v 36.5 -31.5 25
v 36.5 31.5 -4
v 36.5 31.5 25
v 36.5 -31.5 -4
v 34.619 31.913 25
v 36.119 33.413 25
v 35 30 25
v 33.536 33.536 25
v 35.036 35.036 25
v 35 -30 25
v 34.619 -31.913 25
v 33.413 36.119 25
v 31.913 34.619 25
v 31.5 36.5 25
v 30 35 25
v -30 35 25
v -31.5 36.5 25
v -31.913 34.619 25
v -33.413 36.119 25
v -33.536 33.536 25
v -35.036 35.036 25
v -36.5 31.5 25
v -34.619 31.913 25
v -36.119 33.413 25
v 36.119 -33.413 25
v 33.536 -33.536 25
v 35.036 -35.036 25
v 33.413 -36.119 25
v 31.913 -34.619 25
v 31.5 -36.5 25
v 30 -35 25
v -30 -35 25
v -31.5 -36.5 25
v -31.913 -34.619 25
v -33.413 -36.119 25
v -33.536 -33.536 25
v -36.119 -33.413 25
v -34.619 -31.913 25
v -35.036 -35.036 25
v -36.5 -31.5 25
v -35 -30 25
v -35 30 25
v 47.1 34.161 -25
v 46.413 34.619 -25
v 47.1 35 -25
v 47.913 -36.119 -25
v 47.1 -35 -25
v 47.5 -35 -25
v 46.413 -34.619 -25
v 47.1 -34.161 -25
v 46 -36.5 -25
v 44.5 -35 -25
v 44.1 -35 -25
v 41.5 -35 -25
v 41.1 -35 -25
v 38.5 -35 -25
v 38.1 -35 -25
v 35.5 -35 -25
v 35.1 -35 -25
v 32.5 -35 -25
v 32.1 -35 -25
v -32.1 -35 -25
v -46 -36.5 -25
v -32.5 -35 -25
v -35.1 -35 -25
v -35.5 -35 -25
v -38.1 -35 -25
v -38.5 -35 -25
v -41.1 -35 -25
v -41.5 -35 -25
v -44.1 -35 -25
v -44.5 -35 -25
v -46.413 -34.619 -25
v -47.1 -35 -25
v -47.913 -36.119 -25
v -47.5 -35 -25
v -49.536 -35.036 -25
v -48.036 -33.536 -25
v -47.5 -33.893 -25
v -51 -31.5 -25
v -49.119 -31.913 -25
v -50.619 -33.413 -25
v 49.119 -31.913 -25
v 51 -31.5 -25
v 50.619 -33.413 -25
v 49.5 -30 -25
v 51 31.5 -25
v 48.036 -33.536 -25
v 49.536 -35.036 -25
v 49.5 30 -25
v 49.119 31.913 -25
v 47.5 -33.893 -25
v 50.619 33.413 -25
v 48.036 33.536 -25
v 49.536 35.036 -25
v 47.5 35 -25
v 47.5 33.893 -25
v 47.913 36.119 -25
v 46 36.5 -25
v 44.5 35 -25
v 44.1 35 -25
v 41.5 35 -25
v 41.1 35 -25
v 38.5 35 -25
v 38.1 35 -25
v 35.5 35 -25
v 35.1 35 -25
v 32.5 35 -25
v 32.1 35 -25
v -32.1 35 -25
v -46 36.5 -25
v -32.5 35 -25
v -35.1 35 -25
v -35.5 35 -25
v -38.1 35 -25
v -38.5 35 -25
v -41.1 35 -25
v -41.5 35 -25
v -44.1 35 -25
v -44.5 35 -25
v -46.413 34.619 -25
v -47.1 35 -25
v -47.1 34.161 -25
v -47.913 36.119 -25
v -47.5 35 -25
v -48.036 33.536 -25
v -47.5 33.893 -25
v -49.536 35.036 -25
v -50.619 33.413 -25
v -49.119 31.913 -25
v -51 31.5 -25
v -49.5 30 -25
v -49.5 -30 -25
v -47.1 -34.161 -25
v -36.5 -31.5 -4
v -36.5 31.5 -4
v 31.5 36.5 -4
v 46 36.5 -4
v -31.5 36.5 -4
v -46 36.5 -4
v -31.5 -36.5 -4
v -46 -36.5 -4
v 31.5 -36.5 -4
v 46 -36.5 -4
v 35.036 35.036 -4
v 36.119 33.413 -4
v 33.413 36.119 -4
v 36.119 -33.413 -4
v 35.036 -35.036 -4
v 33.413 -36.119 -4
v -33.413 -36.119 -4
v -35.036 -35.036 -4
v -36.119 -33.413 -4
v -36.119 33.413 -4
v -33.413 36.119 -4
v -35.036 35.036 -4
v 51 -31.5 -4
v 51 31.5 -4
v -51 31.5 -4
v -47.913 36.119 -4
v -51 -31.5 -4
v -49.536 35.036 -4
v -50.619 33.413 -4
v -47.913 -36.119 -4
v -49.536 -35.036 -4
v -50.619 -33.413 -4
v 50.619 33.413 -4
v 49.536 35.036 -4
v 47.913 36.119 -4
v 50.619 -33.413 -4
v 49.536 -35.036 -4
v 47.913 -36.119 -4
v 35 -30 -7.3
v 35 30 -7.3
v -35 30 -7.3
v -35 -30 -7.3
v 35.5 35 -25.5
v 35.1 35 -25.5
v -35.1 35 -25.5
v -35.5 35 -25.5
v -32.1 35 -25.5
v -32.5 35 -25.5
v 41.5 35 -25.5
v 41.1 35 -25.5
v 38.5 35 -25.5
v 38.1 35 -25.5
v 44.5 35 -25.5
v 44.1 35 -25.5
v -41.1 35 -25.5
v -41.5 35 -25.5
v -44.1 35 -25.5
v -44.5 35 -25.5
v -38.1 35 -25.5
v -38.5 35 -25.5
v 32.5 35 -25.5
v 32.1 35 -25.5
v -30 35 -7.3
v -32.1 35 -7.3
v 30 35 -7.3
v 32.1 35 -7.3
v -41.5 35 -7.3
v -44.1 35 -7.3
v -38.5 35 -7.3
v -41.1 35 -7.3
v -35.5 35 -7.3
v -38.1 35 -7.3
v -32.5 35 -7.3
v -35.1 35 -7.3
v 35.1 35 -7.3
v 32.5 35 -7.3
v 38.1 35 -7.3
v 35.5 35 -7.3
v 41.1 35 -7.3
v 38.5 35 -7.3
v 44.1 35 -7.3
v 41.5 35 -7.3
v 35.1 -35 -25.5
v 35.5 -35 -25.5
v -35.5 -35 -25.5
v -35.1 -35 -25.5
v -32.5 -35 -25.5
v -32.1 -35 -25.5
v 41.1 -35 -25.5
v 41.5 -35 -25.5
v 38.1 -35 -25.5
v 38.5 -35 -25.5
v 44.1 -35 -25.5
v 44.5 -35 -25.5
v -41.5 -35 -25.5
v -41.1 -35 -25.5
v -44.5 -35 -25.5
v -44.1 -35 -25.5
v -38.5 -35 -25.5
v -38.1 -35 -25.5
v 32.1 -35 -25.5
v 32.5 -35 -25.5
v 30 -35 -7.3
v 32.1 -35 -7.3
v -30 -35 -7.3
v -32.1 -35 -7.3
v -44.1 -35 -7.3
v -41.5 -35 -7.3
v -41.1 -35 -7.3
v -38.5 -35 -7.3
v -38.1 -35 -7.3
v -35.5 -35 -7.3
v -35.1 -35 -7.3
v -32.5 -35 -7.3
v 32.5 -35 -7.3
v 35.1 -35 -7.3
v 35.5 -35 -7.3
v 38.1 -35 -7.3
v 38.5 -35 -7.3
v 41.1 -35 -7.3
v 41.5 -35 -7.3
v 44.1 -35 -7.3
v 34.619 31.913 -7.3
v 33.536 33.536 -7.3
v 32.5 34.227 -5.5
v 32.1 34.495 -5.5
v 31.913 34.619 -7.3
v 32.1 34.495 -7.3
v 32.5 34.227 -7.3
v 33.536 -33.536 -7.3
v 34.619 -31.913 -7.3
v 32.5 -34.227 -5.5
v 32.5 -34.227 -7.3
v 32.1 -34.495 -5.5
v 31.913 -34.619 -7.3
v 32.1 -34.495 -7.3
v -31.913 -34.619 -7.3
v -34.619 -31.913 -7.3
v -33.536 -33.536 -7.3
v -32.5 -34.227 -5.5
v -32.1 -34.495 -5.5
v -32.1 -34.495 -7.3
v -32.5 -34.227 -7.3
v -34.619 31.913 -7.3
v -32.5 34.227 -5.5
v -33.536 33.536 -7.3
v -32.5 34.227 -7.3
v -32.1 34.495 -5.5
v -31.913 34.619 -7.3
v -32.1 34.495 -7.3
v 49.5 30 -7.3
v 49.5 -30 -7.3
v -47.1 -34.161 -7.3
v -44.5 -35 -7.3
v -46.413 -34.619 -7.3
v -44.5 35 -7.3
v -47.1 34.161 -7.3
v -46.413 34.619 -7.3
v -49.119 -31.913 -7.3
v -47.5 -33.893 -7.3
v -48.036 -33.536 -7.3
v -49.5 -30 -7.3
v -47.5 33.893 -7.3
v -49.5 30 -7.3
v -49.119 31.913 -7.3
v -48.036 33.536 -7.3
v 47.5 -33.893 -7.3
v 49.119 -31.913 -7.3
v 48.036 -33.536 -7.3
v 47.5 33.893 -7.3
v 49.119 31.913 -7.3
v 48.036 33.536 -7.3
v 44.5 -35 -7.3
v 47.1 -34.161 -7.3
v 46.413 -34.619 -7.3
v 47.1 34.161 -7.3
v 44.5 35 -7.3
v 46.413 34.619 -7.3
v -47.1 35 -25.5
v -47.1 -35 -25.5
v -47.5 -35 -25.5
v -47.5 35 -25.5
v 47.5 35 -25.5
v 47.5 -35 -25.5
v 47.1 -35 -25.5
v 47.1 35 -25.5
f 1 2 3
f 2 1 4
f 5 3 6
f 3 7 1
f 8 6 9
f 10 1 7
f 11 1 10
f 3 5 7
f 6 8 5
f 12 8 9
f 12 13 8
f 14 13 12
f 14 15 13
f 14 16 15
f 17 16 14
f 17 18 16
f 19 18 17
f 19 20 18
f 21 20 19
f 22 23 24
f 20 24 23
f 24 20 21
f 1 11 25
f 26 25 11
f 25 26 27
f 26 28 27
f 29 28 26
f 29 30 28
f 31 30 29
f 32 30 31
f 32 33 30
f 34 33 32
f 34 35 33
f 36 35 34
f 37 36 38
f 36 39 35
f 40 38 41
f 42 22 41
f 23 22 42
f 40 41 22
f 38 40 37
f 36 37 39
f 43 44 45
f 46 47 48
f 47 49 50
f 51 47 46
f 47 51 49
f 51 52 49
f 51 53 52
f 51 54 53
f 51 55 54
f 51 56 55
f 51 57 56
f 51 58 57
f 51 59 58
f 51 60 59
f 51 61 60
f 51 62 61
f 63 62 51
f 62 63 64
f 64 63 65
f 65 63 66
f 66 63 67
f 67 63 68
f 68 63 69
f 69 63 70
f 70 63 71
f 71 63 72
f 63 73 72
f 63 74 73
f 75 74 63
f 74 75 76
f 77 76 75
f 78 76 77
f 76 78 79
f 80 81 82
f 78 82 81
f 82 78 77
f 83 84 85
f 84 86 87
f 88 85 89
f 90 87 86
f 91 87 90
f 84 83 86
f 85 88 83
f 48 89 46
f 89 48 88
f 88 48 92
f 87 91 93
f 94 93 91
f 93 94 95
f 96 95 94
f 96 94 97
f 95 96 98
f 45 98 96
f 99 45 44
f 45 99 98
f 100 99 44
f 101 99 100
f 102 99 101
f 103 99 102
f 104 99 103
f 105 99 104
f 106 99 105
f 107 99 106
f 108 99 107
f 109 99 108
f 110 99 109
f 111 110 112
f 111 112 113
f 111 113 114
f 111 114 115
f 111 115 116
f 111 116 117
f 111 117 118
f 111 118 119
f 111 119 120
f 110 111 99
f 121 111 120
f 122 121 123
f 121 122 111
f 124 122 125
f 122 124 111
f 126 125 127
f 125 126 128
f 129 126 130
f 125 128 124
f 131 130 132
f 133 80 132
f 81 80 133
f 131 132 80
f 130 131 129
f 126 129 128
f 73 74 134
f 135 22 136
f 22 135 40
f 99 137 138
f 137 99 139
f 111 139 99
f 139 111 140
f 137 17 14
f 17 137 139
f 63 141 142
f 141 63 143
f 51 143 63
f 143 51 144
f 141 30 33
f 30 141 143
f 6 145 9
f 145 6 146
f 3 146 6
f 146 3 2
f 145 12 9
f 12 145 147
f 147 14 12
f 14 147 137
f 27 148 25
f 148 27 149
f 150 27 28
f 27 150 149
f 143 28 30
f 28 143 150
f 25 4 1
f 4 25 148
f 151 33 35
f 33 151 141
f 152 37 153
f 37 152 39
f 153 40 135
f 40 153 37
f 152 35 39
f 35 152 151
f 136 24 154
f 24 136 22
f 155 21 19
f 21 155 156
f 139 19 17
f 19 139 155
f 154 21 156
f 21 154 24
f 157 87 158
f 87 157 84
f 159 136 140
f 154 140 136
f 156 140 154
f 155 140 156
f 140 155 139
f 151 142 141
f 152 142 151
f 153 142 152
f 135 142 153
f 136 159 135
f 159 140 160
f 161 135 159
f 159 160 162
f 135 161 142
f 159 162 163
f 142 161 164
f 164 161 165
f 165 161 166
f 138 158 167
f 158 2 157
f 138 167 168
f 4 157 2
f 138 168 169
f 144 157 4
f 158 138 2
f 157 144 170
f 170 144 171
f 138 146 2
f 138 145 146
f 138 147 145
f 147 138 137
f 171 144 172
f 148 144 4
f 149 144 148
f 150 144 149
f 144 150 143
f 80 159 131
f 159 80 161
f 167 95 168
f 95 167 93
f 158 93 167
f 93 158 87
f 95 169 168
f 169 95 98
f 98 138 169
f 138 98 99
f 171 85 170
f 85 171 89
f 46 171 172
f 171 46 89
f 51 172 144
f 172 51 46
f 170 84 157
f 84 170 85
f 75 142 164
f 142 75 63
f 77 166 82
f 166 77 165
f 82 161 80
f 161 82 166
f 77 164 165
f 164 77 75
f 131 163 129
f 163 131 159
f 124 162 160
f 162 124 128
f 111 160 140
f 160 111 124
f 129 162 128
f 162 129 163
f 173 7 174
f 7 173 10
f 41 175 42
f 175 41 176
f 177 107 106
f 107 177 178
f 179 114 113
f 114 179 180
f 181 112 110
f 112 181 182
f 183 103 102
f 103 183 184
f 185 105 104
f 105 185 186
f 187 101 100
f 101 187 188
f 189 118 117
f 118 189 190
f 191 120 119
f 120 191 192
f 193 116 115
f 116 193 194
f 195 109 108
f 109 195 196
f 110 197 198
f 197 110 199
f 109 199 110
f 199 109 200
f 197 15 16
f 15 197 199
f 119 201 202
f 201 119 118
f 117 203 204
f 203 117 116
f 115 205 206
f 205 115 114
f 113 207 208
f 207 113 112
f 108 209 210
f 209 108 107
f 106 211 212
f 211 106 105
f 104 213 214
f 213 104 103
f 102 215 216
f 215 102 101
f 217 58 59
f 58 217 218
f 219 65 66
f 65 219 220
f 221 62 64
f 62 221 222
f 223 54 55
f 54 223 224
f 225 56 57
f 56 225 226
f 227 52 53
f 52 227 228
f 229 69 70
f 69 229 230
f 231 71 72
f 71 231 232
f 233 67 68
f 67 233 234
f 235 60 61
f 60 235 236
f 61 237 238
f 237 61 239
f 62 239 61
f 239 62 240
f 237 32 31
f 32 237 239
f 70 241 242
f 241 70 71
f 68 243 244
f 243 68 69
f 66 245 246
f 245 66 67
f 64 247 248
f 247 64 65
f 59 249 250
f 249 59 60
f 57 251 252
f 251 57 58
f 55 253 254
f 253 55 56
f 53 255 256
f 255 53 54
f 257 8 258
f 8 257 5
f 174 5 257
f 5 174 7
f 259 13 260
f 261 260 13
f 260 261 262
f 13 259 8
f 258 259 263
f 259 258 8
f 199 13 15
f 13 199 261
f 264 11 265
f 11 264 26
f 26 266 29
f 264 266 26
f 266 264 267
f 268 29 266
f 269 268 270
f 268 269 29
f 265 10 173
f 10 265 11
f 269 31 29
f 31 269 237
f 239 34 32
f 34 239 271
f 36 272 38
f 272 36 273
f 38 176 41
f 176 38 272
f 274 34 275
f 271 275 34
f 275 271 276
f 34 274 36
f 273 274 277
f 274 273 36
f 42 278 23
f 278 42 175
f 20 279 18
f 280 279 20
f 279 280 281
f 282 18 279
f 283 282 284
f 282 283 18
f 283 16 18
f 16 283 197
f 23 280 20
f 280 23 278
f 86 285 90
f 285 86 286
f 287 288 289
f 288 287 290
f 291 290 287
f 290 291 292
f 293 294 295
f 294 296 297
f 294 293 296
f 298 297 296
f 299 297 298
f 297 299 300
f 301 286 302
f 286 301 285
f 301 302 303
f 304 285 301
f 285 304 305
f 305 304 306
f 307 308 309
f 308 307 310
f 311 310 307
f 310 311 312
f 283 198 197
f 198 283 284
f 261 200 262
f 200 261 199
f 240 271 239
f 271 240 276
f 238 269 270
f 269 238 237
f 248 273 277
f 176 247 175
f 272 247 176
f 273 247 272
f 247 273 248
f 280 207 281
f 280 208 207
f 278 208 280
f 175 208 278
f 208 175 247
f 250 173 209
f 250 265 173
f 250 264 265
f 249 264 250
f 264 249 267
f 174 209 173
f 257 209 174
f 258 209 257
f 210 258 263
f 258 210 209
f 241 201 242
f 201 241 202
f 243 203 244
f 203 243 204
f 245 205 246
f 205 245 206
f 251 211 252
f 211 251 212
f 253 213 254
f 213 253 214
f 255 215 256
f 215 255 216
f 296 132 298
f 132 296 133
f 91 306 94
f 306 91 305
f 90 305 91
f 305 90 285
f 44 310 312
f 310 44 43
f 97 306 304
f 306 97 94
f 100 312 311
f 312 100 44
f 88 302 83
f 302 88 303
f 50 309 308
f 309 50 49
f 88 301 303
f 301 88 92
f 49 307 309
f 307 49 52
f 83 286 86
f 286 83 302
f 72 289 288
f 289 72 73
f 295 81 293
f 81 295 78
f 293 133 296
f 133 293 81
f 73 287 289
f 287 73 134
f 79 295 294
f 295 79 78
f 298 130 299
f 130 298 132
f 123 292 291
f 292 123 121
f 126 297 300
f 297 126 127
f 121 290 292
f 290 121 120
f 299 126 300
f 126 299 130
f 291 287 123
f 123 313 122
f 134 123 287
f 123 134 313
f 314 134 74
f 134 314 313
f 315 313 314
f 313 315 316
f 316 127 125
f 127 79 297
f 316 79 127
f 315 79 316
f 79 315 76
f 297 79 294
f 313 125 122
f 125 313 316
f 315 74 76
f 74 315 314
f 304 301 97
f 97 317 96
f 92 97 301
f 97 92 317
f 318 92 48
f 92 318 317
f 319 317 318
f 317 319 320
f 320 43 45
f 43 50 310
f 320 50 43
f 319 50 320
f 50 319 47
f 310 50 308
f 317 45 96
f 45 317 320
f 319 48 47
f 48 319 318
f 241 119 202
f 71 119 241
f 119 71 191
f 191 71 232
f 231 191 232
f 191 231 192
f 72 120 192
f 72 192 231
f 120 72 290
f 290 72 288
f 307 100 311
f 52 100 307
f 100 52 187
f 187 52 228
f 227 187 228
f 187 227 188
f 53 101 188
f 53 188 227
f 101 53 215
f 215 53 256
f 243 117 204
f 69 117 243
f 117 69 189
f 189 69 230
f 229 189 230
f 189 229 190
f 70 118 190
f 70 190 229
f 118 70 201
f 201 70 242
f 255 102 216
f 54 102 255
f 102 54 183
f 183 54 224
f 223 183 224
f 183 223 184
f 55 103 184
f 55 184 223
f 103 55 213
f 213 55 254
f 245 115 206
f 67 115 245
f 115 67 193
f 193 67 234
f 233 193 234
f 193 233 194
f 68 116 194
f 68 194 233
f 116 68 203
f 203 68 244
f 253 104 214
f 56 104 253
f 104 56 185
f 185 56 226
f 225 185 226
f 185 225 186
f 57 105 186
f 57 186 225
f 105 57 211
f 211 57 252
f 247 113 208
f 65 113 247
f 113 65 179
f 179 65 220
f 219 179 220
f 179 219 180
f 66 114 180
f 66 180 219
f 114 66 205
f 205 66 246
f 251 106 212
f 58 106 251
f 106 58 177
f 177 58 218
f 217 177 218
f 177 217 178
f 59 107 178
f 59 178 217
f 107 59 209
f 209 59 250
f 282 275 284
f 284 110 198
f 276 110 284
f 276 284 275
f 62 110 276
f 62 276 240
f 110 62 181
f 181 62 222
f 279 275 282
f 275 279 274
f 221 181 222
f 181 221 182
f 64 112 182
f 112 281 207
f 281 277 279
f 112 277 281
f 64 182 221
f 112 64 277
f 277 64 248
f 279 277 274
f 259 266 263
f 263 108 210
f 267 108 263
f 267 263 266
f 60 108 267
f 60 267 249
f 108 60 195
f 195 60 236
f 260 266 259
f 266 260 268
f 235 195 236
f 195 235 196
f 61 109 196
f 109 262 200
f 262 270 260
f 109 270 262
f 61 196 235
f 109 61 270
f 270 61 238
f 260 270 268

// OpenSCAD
// file: roundCornersCube.scad
/*
http://codeviewer.org/view/code:1b36 
Copyright (C) 2011 Sergio Vilches
This program is free software: you can redistribute it and/or modify it under the terms of the GNU General Public License as published by the Free Software Foundation, either version 3 of the License, or (at your option) any later version.
This program is distributed in the hope that it will be useful, but WITHOUT ANY WARRANTY; without even the implied warranty of MERCHANTABILITY or FITNESS FOR A PARTICULAR PURPOSE. See the GNU General Public License for more details. You should have received a copy of the GNU General Public License along with this program. If not, see <http://www.gnu.org/licenses/>.
Contact: s.vilches.e@gmail.com


    ----------------------------------------------------------- 
                 Round Corners Cube (Extruded)                
      roundCornersCube(x,y,z,r) Where:                        
         - x = Xdir width                                     
         - y = Ydir width                                     
         - z = Height of the cube                             
         - r = Rounding radious                               
                                                              
      Example: roundCornerCube(10,10,2,1);                    
     *Some times it's needed to use F6 to see good results!   
 	 ----------------------------------------------------------- 
*/
// Test it!
// roundCornersCube(10,5,2,1);


module createMeniscus(h,radius) // This module creates the shape that needs to be substracted from a cube to make its corners rounded.
difference(){        //This shape is basicly the difference between a quarter of cylinder and a cube
   translate([radius/2+0.1,radius/2+0.1,0]){
      cube([radius+0.2,radius+0.1,h+0.2],center=true);         // All that 0.x numbers are to avoid "ghost boundaries" when substracting
   }

   cylinder(h=h+0.2,r=radius,$fn = 25,center=true);
}


module roundCornersCube(x,y,z,r)  // Now we just substract the shape we have created in the four corners
difference(){
   cube([x,y,z], center=true);

translate([x/2-r,y/2-r]){  // We move to the first corner (x,y)
      rotate(0){  
         createMeniscus(z,r); // And substract the meniscus
      }
   }
   translate([-x/2+r,y/2-r]){ // To the second corner (-x,y)
      rotate(90){
         createMeniscus(z,r); // But this time we have to rotate the meniscus 90 deg
      }
   }
      translate([-x/2+r,-y/2+r]){ // ... 
      rotate(180){
         createMeniscus(z,r);
      }
   }
      translate([x/2-r,-y/2+r]){
      rotate(270){
         createMeniscus(z,r);
      }
   }
}
// main file
use <roundCornersCube.scad>

wall = 3;

difference() {
	union() {
		roundedCube(73, 73, 50, 5);
		translate([0, 0, -24+(19/2)]) {
			roundedCube(102, 73, 21, 5);					
		}
	}

	roundedCube(70,70,60,5);

	translate([0, 0, -25+(19/2)-1.3]) {
		roundedCube(99,70,19,5);
	}
}

for ( i = [1 : 6] ) {
	translate([-50.3+i*3, 0, -25+(19/2)]) {
		cube(size=[.4, 70, 20], center=true);
	}
	translate([50.3-i*3, 0, -25+(19/2)]) {
		cube(size=[.4, 70, 20], center=true);
	}
}



module roundedCube(x,y,z,r) {
	union() {
	cube(size=[x, y-r*2, z], center=true);
	cube(size=[x-r*2, y, z], center=true);

	translate([x/2-r, y/2-r, 0]) {
		cylinder(r=r, h=z, center=true);					
	}

	translate([x/2-r, -(y/2-r), 0]) {
		cylinder(r=r, h=z, center=true);					
	}

	translate([-(x/2-r), -(y/2-r), 0]) {
		cylinder(r=r, h=z, center=true);					
	}

	translate([-(x/2-r), (y/2-r), 0]) {
		cylinder(r=r, h=z, center=true);					
	}		
	}
}
